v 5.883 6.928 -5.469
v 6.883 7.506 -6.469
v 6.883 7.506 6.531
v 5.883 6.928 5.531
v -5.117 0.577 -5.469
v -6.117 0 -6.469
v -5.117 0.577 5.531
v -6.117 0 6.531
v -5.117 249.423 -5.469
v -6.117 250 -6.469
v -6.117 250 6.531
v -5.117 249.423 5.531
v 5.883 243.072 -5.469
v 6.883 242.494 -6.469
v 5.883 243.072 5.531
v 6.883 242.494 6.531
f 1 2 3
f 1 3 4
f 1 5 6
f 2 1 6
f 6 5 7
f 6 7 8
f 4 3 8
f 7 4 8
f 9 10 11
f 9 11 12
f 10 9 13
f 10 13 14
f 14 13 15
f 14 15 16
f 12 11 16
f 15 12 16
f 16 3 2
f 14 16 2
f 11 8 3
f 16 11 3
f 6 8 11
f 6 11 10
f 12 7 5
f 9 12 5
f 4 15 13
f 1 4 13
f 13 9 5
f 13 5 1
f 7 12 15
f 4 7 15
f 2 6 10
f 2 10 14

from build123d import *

# Parameters (mm, degrees)
SKETCH4_W           = 13
SKETCH4_H           = 13
SKETCH4_W_2         = 11
SKETCH4_H_2         = 11
BOSS_EXTRUDE1_DEPTH = 250
CUT_EXTRUDE1_DEPTH  = 14


with BuildPart() as part:
    # Sketch4 → Boss-Extrude1 (new body)
    with BuildSketch(Plane(origin=(0, 0, 0), x_dir=(1, 0, 0), z_dir=(0, 1, 0))):
        with Locations((0.382825357, -0.030567938)):
            Rectangle(SKETCH4_W, SKETCH4_H)
        with Locations((0.382825357, -0.030567938)):
            Rectangle(SKETCH4_W_2, SKETCH4_H_2, mode=Mode.SUBTRACT)
    extrude(amount=BOSS_EXTRUDE1_DEPTH)

    # Sketch5 → Cut-Extrude1 (cut, through all)
    with BuildSketch(Plane.XY.offset(6.530567938)):
        Polygon((6.882825357, 0), (6.882825357, 7.505553499), (-6.117174643, 0), align=None)
        Polygon((6.882825357, 250), (-6.117174643, 250), (6.882825357, 242.494446501), align=None)
    extrude(amount=-CUT_EXTRUDE1_DEPTH, mode=Mode.SUBTRACT)


solid = part.part
